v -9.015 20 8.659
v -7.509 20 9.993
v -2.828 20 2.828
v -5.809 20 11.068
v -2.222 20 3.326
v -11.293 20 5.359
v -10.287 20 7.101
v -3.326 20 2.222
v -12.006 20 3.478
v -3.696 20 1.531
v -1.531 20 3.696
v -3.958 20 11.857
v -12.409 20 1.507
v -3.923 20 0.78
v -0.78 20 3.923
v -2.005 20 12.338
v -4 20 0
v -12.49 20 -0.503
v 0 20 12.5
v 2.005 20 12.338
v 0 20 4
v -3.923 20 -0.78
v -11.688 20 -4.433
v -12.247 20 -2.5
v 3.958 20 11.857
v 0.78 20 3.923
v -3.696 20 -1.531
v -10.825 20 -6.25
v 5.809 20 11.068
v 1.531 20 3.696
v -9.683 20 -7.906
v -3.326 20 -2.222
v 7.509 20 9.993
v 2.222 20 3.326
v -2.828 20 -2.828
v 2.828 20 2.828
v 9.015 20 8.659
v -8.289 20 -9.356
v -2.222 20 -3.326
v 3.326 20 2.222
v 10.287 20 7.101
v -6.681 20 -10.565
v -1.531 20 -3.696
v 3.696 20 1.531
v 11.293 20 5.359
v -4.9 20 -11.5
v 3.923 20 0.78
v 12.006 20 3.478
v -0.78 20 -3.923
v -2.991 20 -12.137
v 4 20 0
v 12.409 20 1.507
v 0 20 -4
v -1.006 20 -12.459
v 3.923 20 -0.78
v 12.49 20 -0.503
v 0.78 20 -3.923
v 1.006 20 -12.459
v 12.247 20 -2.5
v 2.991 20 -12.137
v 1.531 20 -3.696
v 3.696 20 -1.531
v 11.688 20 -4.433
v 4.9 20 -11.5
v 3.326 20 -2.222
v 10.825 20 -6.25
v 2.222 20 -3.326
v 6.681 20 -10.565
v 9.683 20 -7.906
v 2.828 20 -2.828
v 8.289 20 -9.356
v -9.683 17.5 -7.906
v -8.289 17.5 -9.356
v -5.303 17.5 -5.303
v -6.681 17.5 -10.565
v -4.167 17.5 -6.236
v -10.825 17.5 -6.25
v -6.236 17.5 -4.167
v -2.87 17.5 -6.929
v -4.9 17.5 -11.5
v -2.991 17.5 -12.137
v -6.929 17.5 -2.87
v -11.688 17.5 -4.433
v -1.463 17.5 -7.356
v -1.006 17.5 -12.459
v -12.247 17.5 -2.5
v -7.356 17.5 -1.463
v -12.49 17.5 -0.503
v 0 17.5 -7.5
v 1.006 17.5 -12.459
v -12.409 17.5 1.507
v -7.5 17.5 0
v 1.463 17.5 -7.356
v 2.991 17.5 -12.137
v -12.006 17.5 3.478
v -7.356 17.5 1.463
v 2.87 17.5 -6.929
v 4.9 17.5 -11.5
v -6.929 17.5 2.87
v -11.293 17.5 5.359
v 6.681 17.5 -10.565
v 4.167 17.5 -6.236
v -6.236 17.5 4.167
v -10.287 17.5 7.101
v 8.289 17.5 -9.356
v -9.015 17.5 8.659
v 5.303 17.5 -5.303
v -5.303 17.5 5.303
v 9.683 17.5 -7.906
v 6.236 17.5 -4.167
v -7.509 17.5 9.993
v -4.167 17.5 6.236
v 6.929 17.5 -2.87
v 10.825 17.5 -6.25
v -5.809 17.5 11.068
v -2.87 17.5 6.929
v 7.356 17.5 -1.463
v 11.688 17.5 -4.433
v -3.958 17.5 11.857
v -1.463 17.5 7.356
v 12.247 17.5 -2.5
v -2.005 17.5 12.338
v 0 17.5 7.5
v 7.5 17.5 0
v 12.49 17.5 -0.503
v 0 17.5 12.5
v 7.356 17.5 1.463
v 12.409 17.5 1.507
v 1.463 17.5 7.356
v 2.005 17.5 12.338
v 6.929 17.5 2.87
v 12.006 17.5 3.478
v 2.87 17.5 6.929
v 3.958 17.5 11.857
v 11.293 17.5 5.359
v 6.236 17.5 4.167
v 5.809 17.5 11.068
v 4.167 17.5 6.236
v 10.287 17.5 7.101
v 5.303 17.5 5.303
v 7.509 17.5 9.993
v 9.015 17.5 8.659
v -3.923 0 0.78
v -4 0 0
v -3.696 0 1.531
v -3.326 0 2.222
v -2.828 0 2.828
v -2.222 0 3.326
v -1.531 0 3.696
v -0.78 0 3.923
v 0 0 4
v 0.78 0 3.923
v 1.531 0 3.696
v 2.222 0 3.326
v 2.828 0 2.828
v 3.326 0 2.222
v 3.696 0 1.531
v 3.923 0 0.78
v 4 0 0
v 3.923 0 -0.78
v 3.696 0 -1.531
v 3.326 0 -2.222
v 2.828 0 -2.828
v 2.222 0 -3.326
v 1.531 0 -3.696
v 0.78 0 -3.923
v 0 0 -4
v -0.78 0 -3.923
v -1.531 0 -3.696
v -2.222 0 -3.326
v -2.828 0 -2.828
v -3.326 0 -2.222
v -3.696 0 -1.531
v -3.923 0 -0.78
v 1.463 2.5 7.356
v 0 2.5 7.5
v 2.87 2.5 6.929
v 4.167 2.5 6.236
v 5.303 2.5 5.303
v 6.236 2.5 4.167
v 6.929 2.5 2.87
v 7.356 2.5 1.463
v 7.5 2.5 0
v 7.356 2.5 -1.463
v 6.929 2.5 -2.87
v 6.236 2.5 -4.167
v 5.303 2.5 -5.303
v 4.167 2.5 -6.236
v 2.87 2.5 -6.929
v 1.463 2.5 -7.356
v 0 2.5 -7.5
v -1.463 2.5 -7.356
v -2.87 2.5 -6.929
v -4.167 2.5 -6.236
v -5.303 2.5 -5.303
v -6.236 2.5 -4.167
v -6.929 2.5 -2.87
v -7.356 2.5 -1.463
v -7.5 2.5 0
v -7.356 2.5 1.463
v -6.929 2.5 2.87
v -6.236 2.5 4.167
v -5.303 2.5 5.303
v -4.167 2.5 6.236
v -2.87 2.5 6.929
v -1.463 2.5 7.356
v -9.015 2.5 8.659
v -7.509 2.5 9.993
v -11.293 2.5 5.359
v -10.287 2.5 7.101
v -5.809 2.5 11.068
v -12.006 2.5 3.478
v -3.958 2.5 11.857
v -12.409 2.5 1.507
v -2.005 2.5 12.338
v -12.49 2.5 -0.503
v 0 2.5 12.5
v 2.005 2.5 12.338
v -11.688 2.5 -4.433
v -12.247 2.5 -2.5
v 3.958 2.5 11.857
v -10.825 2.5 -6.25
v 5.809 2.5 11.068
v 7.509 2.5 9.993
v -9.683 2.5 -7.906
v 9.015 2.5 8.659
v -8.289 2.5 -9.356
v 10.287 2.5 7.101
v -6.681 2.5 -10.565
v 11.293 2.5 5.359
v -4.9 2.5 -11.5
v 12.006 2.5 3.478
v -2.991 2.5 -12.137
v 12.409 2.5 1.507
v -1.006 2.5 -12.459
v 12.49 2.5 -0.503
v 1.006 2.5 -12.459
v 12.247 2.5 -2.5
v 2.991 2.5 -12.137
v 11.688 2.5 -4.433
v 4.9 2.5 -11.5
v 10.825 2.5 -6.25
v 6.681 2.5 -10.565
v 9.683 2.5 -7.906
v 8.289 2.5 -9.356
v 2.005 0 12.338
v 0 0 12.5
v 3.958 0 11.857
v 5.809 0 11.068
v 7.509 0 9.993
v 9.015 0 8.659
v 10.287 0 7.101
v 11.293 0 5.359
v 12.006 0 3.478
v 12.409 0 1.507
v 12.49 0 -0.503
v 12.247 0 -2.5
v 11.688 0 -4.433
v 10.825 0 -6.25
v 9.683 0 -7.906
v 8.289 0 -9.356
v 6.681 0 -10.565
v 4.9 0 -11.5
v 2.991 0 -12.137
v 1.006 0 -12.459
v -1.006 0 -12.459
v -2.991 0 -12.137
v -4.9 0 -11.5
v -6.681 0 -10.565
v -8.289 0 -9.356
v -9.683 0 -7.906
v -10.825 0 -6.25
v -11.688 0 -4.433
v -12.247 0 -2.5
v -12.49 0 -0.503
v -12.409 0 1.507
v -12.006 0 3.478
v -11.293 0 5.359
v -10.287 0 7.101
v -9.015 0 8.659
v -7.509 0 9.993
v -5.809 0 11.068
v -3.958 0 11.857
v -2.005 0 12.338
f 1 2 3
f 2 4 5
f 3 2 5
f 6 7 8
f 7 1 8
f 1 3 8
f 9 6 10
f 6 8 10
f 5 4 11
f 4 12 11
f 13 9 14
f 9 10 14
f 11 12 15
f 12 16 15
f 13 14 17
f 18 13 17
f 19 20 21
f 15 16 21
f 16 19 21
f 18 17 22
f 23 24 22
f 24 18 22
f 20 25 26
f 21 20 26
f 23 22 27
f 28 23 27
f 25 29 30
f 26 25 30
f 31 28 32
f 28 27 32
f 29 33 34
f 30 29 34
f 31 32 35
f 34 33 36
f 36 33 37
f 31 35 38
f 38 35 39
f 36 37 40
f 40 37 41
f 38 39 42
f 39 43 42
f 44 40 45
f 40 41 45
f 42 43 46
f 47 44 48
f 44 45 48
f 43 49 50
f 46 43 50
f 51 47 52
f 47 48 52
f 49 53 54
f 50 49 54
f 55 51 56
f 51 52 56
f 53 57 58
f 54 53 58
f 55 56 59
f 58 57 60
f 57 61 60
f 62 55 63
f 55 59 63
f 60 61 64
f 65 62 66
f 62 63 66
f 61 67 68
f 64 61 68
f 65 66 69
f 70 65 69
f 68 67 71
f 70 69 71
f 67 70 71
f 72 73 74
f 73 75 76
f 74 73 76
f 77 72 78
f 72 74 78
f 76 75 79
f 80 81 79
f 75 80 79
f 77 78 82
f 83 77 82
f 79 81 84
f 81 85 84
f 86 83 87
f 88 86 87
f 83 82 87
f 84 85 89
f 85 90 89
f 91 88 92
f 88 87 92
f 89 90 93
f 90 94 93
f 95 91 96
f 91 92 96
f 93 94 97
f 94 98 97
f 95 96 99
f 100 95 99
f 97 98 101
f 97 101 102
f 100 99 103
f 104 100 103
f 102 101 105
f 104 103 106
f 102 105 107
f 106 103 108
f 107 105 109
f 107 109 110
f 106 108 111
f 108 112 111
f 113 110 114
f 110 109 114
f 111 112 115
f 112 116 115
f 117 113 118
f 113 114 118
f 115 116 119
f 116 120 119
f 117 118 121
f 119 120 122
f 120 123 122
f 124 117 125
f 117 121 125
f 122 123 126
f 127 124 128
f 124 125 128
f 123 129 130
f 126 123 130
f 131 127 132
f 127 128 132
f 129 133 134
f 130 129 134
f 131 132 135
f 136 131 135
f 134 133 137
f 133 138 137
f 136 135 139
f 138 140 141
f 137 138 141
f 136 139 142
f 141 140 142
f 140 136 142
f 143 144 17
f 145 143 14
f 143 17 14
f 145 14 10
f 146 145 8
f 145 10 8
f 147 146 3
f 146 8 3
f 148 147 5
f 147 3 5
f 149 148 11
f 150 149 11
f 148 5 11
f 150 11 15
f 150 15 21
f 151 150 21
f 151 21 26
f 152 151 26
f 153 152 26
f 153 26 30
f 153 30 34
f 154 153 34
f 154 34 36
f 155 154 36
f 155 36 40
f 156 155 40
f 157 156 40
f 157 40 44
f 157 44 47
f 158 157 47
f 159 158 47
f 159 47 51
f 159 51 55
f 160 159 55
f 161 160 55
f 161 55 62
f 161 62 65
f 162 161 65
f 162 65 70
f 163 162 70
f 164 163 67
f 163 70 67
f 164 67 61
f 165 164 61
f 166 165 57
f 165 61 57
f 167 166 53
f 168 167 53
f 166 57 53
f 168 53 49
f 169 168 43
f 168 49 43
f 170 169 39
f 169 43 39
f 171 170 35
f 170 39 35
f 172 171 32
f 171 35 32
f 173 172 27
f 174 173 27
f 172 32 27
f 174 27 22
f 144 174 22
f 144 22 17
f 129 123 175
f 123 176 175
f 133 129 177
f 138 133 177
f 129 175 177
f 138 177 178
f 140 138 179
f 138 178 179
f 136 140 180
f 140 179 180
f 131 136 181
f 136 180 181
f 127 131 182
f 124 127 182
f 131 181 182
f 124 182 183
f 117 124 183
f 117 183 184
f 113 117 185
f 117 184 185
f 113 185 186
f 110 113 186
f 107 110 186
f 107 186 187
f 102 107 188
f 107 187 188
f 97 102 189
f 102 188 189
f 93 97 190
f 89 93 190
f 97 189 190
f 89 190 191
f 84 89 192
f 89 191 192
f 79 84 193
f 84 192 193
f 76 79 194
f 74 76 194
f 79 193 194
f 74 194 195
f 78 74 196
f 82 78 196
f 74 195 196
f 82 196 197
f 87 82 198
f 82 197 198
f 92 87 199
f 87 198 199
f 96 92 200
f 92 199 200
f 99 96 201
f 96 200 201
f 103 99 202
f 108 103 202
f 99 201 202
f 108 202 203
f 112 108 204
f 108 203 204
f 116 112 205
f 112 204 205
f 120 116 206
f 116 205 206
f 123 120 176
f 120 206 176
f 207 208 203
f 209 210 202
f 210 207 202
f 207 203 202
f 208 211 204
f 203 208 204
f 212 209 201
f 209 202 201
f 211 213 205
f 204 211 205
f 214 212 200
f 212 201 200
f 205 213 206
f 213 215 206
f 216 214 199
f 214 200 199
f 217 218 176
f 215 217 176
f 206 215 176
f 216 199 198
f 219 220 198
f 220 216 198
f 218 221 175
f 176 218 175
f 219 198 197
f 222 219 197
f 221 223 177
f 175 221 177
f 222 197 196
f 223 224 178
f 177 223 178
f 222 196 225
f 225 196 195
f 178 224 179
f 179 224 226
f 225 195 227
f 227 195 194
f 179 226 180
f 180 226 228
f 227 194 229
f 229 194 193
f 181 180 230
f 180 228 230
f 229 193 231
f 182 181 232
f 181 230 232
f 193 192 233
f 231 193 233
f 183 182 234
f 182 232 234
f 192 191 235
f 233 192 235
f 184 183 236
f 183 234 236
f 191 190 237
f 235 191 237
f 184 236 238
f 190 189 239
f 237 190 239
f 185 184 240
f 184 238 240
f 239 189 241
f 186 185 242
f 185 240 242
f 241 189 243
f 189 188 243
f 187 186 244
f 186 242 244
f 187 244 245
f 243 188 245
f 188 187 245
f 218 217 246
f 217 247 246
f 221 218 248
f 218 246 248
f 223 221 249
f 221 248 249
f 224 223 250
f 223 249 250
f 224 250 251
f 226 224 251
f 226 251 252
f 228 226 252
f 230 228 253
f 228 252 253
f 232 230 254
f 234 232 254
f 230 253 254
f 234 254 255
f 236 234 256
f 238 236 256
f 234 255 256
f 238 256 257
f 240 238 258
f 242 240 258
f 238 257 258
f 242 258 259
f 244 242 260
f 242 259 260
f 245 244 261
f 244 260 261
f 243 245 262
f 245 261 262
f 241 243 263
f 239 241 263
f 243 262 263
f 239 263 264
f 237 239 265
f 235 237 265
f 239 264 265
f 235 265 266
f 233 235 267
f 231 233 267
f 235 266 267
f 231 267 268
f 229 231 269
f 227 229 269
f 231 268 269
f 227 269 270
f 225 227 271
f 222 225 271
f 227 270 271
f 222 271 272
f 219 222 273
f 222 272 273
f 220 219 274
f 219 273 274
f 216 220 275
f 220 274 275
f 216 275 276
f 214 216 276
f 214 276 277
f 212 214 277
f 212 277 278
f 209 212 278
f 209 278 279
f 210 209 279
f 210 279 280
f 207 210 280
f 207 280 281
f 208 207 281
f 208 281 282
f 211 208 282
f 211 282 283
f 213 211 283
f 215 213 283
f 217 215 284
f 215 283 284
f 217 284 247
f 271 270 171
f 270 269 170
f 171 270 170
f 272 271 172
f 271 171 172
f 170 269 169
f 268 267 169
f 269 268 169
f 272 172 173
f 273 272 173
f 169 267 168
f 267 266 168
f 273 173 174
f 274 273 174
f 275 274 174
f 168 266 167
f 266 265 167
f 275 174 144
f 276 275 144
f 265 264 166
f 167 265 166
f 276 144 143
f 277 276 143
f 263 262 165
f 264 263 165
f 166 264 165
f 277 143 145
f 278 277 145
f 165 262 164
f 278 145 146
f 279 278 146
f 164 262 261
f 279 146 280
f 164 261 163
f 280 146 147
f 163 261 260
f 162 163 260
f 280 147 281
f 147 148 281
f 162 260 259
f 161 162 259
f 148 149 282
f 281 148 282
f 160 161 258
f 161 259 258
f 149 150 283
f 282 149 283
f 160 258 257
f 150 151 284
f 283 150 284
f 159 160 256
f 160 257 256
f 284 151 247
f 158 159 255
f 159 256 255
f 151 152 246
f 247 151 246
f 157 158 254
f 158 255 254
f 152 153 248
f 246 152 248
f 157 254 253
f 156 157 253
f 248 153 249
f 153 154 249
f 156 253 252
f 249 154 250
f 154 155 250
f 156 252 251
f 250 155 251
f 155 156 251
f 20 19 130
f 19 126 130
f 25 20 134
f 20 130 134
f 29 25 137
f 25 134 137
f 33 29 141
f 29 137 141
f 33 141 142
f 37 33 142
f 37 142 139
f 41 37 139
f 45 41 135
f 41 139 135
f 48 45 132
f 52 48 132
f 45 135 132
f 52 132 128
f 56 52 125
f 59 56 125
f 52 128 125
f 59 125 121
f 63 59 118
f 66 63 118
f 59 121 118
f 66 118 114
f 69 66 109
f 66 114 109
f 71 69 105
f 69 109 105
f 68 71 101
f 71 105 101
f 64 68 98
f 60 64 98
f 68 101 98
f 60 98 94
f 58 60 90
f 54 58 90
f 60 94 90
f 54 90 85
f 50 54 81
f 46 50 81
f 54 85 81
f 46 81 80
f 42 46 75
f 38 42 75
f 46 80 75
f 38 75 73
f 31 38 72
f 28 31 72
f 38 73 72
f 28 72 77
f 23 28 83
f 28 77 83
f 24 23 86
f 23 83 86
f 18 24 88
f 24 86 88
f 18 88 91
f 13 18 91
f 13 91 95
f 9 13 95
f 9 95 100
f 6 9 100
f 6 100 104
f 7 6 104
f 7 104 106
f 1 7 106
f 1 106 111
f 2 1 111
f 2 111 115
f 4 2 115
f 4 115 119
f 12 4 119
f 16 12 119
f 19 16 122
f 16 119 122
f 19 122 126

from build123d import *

# Parameters (mm, degrees)
F3_D = 8


with BuildPart() as f1:
    # F0 (on Right) → F1 (revolve)
    with BuildSketch(Plane.YZ):
        Polygon((0, 12.5), (0, 0), (20, 0), (20, 12.5), (17.5, 12.5), (17.5, 7.5), (2.5, 7.5), (2.5, 12.5), align=None)
    revolve(axis=Axis((0, 10, 0), (0, 1, 0)))

    # F3 (through all)
    with Locations(Plane.XZ):
        with Locations((0, 0)):
            Hole(F3_D / 2)


solid = f1.part
